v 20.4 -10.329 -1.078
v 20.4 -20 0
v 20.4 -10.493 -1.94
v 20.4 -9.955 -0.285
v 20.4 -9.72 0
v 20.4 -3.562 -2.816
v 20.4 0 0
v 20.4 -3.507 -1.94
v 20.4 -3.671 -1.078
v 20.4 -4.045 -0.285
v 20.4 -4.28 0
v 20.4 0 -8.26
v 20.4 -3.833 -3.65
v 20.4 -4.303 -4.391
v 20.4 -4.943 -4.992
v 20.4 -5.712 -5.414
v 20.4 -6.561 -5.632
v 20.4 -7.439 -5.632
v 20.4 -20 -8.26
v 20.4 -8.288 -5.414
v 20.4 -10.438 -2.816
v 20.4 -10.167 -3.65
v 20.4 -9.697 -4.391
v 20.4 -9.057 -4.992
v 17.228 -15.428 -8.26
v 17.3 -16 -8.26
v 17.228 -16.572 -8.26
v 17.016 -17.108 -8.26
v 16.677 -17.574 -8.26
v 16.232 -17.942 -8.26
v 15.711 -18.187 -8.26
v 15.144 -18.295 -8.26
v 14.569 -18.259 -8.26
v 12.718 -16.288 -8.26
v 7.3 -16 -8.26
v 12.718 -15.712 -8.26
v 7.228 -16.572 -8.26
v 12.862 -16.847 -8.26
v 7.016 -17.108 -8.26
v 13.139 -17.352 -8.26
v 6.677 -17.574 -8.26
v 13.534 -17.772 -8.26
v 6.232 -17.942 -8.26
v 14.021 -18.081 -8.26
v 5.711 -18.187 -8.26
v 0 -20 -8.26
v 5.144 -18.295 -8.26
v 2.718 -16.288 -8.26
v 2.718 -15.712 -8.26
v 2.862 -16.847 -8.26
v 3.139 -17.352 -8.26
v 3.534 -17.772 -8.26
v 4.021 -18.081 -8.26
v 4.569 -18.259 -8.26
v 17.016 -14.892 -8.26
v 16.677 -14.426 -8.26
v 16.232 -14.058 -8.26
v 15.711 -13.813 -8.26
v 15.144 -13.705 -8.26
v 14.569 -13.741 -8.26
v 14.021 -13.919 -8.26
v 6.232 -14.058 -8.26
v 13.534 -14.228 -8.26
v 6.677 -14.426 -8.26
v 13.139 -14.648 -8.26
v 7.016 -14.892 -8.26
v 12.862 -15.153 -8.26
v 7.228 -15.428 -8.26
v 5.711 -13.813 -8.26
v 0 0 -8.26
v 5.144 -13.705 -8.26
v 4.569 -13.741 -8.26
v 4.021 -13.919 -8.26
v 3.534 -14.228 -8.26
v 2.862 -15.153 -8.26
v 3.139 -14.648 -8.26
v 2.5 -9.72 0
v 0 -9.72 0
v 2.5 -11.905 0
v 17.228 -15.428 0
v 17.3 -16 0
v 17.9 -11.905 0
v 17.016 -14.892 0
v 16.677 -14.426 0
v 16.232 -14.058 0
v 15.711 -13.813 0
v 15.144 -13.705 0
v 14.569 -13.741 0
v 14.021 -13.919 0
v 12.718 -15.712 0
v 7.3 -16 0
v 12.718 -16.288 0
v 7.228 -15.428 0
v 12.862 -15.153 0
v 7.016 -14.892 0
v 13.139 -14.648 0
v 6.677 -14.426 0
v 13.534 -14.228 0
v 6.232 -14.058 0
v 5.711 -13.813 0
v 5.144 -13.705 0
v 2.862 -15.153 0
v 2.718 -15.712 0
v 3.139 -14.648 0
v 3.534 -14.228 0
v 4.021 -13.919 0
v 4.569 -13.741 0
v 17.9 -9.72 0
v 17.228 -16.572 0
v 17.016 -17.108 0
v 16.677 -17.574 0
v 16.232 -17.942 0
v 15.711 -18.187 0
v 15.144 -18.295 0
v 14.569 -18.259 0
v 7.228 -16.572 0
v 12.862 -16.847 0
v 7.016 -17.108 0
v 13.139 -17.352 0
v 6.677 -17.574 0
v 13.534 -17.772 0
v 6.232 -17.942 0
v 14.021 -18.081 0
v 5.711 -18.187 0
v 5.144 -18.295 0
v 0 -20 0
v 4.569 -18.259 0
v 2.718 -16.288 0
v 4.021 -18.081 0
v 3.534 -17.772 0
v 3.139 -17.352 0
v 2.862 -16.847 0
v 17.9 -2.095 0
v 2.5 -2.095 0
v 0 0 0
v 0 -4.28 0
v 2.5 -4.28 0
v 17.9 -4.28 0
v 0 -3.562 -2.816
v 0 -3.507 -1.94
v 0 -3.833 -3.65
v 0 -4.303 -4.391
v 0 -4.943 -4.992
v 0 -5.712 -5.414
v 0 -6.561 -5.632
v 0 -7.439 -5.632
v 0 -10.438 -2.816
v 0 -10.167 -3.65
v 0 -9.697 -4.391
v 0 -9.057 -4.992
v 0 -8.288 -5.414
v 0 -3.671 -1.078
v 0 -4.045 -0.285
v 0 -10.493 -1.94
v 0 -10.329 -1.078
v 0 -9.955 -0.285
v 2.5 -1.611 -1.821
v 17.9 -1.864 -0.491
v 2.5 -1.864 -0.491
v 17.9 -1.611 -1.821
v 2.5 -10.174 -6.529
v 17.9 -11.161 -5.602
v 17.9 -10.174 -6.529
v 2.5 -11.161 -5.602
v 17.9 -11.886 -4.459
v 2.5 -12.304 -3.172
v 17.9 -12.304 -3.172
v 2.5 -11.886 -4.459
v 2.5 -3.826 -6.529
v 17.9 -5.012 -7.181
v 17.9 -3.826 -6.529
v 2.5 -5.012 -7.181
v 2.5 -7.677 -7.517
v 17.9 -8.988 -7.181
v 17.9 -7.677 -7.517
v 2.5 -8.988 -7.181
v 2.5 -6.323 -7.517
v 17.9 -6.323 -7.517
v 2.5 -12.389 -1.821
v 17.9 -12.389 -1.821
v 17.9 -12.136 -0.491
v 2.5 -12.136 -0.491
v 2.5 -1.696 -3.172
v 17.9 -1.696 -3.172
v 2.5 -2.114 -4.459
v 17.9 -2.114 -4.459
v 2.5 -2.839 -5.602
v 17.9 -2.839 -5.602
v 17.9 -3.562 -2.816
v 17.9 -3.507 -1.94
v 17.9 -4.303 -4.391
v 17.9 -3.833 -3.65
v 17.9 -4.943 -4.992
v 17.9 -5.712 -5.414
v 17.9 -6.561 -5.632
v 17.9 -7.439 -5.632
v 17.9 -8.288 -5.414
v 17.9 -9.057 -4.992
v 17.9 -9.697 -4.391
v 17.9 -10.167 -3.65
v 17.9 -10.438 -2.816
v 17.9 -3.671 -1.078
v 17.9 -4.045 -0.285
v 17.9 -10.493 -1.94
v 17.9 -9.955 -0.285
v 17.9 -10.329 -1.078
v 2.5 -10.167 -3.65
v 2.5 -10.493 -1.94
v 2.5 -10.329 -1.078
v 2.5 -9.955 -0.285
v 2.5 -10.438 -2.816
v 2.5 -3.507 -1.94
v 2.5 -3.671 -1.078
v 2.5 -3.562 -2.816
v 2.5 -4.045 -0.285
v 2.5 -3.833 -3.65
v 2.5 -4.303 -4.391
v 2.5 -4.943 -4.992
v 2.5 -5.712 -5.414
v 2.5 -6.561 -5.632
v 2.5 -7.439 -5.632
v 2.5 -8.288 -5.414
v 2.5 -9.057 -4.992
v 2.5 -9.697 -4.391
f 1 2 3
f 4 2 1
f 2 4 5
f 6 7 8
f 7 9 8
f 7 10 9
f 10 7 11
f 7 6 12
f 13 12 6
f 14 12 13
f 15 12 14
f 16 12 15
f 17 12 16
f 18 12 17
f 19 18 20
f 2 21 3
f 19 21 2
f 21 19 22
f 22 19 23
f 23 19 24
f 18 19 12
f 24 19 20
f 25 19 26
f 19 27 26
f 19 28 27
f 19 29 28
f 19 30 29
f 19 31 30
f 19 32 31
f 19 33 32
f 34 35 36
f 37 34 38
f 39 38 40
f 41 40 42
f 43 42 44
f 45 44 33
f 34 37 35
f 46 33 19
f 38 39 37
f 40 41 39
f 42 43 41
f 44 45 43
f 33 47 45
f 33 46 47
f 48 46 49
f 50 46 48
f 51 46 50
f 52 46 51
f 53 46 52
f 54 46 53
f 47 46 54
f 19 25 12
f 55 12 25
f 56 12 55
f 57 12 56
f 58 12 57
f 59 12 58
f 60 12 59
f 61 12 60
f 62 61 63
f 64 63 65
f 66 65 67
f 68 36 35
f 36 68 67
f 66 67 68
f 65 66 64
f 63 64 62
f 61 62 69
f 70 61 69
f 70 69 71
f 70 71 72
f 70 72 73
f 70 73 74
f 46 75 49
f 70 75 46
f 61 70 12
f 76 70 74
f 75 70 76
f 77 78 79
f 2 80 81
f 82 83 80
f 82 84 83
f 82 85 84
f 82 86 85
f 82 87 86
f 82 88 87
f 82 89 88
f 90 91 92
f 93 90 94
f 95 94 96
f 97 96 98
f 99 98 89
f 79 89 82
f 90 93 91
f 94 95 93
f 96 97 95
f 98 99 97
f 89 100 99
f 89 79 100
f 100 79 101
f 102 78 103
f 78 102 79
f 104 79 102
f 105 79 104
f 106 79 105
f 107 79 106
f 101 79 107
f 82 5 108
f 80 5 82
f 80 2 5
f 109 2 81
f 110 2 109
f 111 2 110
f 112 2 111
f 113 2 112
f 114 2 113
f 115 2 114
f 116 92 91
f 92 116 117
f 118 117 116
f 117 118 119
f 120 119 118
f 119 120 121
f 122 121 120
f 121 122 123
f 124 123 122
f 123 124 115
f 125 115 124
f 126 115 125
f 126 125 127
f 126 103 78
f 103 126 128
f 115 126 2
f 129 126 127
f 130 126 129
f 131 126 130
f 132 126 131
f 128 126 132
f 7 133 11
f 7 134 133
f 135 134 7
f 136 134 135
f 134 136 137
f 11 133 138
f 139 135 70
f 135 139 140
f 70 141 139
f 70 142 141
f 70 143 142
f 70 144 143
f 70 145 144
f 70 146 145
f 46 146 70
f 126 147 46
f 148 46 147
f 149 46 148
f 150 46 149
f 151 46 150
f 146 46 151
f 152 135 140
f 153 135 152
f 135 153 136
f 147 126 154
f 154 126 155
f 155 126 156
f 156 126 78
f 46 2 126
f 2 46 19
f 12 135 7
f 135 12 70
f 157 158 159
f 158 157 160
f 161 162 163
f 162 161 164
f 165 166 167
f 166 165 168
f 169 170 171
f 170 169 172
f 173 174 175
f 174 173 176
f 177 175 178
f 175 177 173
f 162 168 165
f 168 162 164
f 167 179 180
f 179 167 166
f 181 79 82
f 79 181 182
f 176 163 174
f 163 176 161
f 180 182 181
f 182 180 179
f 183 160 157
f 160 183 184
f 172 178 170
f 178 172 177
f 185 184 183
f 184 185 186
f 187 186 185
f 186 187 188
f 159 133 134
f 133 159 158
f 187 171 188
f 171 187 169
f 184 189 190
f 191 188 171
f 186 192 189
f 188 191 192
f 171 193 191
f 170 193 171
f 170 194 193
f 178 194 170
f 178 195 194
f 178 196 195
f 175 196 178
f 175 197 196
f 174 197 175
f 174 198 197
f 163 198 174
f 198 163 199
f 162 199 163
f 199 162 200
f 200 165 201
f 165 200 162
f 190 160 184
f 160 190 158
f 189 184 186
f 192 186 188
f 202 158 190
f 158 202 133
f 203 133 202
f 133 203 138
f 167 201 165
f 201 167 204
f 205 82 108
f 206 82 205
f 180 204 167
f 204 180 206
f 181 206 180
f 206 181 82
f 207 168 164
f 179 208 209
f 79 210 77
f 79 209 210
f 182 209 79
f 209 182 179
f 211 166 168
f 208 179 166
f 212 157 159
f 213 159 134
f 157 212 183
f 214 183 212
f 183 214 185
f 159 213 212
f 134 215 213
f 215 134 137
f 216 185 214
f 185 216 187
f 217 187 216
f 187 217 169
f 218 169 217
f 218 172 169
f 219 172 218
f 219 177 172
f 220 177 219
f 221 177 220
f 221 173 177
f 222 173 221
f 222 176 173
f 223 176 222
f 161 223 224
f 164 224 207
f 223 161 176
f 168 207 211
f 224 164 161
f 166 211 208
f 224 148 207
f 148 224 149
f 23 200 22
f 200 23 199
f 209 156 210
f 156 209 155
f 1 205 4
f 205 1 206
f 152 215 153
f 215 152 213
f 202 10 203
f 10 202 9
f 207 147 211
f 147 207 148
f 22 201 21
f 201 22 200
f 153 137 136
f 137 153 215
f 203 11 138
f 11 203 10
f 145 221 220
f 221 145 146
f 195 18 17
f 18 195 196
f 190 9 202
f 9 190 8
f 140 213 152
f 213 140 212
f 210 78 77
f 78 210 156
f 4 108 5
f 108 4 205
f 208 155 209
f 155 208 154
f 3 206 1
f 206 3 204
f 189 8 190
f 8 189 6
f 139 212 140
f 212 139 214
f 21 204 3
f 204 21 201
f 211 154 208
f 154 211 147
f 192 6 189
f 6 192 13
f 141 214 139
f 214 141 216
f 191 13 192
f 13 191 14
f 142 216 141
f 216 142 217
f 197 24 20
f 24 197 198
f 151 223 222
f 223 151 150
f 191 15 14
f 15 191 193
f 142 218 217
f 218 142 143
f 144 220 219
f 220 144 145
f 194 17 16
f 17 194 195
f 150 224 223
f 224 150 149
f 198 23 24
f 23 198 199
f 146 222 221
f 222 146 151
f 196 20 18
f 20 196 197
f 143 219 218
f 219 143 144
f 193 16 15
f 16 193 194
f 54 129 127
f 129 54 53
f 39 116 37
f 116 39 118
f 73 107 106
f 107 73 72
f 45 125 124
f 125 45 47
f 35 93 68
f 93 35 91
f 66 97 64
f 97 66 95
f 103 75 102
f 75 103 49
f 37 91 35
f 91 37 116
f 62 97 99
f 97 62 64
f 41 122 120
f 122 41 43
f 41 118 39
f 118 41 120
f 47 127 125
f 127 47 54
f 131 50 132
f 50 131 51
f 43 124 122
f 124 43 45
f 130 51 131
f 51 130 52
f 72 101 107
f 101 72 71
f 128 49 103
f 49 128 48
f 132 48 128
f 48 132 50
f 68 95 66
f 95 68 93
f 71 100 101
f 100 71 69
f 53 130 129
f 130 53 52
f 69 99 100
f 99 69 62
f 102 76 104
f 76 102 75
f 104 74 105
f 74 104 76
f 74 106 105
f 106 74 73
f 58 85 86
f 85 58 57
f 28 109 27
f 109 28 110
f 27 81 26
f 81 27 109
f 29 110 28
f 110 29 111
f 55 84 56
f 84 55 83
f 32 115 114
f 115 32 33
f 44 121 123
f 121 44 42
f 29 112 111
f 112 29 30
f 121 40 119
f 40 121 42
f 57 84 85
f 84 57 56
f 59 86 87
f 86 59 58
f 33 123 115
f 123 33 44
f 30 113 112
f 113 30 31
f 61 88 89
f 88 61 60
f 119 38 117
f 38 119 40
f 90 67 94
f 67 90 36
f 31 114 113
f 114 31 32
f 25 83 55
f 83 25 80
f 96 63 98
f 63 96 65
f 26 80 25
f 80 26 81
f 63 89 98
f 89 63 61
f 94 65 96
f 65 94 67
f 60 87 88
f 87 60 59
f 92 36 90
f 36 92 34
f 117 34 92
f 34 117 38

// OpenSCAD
// holder for linear bearing D_in=5mm, L=15mm. Side mounting
d_in = 5.0;   // inner diameter
d_out = 10.0; // outer diameter
L_all = 15.4; //

r1   = d_out / 2 + 0.4;
r_in = d_in  / 2 + 1.0;
r_h  = 4.0 / 2 + 0.3;

// include <atu_supports.scad>
// include <atu_nut_axis.scad>

kz = 0.70;
xw = 2.5; // wall
yw = 2.0;
ys = 6.0;
xa = L_all + 2 * xw;
ya = d_out + 2 * yw;
yc = ya / 2;
zc = r1 * 2 * ( kz - 0.5 );
za = zc + r1 + 0.7;

$fn=25;


module lbe_ho_5x15_side()
{
  difference() {
    cube( [xa,ya+ys,za] );
    translate([ xw,yc,zc]) rotate([0,90,0]) cylinder( r=r1, h=L_all );
    translate([  0,yc,zc]) rotate([0,90,0]) cylinder( r=r_in, h=xa );
    translate([  5,ya+yw,0]) rotate([0,0,0]) cylinder( r=r_h, h=za );
    translate([ 15,ya+yw,0]) rotate([0,0,0]) cylinder( r=r_h, h=za );
  }
}

// lbe_ho_5x15_side();
rotate([180,0,0]) lbe_ho_5x15_side();
